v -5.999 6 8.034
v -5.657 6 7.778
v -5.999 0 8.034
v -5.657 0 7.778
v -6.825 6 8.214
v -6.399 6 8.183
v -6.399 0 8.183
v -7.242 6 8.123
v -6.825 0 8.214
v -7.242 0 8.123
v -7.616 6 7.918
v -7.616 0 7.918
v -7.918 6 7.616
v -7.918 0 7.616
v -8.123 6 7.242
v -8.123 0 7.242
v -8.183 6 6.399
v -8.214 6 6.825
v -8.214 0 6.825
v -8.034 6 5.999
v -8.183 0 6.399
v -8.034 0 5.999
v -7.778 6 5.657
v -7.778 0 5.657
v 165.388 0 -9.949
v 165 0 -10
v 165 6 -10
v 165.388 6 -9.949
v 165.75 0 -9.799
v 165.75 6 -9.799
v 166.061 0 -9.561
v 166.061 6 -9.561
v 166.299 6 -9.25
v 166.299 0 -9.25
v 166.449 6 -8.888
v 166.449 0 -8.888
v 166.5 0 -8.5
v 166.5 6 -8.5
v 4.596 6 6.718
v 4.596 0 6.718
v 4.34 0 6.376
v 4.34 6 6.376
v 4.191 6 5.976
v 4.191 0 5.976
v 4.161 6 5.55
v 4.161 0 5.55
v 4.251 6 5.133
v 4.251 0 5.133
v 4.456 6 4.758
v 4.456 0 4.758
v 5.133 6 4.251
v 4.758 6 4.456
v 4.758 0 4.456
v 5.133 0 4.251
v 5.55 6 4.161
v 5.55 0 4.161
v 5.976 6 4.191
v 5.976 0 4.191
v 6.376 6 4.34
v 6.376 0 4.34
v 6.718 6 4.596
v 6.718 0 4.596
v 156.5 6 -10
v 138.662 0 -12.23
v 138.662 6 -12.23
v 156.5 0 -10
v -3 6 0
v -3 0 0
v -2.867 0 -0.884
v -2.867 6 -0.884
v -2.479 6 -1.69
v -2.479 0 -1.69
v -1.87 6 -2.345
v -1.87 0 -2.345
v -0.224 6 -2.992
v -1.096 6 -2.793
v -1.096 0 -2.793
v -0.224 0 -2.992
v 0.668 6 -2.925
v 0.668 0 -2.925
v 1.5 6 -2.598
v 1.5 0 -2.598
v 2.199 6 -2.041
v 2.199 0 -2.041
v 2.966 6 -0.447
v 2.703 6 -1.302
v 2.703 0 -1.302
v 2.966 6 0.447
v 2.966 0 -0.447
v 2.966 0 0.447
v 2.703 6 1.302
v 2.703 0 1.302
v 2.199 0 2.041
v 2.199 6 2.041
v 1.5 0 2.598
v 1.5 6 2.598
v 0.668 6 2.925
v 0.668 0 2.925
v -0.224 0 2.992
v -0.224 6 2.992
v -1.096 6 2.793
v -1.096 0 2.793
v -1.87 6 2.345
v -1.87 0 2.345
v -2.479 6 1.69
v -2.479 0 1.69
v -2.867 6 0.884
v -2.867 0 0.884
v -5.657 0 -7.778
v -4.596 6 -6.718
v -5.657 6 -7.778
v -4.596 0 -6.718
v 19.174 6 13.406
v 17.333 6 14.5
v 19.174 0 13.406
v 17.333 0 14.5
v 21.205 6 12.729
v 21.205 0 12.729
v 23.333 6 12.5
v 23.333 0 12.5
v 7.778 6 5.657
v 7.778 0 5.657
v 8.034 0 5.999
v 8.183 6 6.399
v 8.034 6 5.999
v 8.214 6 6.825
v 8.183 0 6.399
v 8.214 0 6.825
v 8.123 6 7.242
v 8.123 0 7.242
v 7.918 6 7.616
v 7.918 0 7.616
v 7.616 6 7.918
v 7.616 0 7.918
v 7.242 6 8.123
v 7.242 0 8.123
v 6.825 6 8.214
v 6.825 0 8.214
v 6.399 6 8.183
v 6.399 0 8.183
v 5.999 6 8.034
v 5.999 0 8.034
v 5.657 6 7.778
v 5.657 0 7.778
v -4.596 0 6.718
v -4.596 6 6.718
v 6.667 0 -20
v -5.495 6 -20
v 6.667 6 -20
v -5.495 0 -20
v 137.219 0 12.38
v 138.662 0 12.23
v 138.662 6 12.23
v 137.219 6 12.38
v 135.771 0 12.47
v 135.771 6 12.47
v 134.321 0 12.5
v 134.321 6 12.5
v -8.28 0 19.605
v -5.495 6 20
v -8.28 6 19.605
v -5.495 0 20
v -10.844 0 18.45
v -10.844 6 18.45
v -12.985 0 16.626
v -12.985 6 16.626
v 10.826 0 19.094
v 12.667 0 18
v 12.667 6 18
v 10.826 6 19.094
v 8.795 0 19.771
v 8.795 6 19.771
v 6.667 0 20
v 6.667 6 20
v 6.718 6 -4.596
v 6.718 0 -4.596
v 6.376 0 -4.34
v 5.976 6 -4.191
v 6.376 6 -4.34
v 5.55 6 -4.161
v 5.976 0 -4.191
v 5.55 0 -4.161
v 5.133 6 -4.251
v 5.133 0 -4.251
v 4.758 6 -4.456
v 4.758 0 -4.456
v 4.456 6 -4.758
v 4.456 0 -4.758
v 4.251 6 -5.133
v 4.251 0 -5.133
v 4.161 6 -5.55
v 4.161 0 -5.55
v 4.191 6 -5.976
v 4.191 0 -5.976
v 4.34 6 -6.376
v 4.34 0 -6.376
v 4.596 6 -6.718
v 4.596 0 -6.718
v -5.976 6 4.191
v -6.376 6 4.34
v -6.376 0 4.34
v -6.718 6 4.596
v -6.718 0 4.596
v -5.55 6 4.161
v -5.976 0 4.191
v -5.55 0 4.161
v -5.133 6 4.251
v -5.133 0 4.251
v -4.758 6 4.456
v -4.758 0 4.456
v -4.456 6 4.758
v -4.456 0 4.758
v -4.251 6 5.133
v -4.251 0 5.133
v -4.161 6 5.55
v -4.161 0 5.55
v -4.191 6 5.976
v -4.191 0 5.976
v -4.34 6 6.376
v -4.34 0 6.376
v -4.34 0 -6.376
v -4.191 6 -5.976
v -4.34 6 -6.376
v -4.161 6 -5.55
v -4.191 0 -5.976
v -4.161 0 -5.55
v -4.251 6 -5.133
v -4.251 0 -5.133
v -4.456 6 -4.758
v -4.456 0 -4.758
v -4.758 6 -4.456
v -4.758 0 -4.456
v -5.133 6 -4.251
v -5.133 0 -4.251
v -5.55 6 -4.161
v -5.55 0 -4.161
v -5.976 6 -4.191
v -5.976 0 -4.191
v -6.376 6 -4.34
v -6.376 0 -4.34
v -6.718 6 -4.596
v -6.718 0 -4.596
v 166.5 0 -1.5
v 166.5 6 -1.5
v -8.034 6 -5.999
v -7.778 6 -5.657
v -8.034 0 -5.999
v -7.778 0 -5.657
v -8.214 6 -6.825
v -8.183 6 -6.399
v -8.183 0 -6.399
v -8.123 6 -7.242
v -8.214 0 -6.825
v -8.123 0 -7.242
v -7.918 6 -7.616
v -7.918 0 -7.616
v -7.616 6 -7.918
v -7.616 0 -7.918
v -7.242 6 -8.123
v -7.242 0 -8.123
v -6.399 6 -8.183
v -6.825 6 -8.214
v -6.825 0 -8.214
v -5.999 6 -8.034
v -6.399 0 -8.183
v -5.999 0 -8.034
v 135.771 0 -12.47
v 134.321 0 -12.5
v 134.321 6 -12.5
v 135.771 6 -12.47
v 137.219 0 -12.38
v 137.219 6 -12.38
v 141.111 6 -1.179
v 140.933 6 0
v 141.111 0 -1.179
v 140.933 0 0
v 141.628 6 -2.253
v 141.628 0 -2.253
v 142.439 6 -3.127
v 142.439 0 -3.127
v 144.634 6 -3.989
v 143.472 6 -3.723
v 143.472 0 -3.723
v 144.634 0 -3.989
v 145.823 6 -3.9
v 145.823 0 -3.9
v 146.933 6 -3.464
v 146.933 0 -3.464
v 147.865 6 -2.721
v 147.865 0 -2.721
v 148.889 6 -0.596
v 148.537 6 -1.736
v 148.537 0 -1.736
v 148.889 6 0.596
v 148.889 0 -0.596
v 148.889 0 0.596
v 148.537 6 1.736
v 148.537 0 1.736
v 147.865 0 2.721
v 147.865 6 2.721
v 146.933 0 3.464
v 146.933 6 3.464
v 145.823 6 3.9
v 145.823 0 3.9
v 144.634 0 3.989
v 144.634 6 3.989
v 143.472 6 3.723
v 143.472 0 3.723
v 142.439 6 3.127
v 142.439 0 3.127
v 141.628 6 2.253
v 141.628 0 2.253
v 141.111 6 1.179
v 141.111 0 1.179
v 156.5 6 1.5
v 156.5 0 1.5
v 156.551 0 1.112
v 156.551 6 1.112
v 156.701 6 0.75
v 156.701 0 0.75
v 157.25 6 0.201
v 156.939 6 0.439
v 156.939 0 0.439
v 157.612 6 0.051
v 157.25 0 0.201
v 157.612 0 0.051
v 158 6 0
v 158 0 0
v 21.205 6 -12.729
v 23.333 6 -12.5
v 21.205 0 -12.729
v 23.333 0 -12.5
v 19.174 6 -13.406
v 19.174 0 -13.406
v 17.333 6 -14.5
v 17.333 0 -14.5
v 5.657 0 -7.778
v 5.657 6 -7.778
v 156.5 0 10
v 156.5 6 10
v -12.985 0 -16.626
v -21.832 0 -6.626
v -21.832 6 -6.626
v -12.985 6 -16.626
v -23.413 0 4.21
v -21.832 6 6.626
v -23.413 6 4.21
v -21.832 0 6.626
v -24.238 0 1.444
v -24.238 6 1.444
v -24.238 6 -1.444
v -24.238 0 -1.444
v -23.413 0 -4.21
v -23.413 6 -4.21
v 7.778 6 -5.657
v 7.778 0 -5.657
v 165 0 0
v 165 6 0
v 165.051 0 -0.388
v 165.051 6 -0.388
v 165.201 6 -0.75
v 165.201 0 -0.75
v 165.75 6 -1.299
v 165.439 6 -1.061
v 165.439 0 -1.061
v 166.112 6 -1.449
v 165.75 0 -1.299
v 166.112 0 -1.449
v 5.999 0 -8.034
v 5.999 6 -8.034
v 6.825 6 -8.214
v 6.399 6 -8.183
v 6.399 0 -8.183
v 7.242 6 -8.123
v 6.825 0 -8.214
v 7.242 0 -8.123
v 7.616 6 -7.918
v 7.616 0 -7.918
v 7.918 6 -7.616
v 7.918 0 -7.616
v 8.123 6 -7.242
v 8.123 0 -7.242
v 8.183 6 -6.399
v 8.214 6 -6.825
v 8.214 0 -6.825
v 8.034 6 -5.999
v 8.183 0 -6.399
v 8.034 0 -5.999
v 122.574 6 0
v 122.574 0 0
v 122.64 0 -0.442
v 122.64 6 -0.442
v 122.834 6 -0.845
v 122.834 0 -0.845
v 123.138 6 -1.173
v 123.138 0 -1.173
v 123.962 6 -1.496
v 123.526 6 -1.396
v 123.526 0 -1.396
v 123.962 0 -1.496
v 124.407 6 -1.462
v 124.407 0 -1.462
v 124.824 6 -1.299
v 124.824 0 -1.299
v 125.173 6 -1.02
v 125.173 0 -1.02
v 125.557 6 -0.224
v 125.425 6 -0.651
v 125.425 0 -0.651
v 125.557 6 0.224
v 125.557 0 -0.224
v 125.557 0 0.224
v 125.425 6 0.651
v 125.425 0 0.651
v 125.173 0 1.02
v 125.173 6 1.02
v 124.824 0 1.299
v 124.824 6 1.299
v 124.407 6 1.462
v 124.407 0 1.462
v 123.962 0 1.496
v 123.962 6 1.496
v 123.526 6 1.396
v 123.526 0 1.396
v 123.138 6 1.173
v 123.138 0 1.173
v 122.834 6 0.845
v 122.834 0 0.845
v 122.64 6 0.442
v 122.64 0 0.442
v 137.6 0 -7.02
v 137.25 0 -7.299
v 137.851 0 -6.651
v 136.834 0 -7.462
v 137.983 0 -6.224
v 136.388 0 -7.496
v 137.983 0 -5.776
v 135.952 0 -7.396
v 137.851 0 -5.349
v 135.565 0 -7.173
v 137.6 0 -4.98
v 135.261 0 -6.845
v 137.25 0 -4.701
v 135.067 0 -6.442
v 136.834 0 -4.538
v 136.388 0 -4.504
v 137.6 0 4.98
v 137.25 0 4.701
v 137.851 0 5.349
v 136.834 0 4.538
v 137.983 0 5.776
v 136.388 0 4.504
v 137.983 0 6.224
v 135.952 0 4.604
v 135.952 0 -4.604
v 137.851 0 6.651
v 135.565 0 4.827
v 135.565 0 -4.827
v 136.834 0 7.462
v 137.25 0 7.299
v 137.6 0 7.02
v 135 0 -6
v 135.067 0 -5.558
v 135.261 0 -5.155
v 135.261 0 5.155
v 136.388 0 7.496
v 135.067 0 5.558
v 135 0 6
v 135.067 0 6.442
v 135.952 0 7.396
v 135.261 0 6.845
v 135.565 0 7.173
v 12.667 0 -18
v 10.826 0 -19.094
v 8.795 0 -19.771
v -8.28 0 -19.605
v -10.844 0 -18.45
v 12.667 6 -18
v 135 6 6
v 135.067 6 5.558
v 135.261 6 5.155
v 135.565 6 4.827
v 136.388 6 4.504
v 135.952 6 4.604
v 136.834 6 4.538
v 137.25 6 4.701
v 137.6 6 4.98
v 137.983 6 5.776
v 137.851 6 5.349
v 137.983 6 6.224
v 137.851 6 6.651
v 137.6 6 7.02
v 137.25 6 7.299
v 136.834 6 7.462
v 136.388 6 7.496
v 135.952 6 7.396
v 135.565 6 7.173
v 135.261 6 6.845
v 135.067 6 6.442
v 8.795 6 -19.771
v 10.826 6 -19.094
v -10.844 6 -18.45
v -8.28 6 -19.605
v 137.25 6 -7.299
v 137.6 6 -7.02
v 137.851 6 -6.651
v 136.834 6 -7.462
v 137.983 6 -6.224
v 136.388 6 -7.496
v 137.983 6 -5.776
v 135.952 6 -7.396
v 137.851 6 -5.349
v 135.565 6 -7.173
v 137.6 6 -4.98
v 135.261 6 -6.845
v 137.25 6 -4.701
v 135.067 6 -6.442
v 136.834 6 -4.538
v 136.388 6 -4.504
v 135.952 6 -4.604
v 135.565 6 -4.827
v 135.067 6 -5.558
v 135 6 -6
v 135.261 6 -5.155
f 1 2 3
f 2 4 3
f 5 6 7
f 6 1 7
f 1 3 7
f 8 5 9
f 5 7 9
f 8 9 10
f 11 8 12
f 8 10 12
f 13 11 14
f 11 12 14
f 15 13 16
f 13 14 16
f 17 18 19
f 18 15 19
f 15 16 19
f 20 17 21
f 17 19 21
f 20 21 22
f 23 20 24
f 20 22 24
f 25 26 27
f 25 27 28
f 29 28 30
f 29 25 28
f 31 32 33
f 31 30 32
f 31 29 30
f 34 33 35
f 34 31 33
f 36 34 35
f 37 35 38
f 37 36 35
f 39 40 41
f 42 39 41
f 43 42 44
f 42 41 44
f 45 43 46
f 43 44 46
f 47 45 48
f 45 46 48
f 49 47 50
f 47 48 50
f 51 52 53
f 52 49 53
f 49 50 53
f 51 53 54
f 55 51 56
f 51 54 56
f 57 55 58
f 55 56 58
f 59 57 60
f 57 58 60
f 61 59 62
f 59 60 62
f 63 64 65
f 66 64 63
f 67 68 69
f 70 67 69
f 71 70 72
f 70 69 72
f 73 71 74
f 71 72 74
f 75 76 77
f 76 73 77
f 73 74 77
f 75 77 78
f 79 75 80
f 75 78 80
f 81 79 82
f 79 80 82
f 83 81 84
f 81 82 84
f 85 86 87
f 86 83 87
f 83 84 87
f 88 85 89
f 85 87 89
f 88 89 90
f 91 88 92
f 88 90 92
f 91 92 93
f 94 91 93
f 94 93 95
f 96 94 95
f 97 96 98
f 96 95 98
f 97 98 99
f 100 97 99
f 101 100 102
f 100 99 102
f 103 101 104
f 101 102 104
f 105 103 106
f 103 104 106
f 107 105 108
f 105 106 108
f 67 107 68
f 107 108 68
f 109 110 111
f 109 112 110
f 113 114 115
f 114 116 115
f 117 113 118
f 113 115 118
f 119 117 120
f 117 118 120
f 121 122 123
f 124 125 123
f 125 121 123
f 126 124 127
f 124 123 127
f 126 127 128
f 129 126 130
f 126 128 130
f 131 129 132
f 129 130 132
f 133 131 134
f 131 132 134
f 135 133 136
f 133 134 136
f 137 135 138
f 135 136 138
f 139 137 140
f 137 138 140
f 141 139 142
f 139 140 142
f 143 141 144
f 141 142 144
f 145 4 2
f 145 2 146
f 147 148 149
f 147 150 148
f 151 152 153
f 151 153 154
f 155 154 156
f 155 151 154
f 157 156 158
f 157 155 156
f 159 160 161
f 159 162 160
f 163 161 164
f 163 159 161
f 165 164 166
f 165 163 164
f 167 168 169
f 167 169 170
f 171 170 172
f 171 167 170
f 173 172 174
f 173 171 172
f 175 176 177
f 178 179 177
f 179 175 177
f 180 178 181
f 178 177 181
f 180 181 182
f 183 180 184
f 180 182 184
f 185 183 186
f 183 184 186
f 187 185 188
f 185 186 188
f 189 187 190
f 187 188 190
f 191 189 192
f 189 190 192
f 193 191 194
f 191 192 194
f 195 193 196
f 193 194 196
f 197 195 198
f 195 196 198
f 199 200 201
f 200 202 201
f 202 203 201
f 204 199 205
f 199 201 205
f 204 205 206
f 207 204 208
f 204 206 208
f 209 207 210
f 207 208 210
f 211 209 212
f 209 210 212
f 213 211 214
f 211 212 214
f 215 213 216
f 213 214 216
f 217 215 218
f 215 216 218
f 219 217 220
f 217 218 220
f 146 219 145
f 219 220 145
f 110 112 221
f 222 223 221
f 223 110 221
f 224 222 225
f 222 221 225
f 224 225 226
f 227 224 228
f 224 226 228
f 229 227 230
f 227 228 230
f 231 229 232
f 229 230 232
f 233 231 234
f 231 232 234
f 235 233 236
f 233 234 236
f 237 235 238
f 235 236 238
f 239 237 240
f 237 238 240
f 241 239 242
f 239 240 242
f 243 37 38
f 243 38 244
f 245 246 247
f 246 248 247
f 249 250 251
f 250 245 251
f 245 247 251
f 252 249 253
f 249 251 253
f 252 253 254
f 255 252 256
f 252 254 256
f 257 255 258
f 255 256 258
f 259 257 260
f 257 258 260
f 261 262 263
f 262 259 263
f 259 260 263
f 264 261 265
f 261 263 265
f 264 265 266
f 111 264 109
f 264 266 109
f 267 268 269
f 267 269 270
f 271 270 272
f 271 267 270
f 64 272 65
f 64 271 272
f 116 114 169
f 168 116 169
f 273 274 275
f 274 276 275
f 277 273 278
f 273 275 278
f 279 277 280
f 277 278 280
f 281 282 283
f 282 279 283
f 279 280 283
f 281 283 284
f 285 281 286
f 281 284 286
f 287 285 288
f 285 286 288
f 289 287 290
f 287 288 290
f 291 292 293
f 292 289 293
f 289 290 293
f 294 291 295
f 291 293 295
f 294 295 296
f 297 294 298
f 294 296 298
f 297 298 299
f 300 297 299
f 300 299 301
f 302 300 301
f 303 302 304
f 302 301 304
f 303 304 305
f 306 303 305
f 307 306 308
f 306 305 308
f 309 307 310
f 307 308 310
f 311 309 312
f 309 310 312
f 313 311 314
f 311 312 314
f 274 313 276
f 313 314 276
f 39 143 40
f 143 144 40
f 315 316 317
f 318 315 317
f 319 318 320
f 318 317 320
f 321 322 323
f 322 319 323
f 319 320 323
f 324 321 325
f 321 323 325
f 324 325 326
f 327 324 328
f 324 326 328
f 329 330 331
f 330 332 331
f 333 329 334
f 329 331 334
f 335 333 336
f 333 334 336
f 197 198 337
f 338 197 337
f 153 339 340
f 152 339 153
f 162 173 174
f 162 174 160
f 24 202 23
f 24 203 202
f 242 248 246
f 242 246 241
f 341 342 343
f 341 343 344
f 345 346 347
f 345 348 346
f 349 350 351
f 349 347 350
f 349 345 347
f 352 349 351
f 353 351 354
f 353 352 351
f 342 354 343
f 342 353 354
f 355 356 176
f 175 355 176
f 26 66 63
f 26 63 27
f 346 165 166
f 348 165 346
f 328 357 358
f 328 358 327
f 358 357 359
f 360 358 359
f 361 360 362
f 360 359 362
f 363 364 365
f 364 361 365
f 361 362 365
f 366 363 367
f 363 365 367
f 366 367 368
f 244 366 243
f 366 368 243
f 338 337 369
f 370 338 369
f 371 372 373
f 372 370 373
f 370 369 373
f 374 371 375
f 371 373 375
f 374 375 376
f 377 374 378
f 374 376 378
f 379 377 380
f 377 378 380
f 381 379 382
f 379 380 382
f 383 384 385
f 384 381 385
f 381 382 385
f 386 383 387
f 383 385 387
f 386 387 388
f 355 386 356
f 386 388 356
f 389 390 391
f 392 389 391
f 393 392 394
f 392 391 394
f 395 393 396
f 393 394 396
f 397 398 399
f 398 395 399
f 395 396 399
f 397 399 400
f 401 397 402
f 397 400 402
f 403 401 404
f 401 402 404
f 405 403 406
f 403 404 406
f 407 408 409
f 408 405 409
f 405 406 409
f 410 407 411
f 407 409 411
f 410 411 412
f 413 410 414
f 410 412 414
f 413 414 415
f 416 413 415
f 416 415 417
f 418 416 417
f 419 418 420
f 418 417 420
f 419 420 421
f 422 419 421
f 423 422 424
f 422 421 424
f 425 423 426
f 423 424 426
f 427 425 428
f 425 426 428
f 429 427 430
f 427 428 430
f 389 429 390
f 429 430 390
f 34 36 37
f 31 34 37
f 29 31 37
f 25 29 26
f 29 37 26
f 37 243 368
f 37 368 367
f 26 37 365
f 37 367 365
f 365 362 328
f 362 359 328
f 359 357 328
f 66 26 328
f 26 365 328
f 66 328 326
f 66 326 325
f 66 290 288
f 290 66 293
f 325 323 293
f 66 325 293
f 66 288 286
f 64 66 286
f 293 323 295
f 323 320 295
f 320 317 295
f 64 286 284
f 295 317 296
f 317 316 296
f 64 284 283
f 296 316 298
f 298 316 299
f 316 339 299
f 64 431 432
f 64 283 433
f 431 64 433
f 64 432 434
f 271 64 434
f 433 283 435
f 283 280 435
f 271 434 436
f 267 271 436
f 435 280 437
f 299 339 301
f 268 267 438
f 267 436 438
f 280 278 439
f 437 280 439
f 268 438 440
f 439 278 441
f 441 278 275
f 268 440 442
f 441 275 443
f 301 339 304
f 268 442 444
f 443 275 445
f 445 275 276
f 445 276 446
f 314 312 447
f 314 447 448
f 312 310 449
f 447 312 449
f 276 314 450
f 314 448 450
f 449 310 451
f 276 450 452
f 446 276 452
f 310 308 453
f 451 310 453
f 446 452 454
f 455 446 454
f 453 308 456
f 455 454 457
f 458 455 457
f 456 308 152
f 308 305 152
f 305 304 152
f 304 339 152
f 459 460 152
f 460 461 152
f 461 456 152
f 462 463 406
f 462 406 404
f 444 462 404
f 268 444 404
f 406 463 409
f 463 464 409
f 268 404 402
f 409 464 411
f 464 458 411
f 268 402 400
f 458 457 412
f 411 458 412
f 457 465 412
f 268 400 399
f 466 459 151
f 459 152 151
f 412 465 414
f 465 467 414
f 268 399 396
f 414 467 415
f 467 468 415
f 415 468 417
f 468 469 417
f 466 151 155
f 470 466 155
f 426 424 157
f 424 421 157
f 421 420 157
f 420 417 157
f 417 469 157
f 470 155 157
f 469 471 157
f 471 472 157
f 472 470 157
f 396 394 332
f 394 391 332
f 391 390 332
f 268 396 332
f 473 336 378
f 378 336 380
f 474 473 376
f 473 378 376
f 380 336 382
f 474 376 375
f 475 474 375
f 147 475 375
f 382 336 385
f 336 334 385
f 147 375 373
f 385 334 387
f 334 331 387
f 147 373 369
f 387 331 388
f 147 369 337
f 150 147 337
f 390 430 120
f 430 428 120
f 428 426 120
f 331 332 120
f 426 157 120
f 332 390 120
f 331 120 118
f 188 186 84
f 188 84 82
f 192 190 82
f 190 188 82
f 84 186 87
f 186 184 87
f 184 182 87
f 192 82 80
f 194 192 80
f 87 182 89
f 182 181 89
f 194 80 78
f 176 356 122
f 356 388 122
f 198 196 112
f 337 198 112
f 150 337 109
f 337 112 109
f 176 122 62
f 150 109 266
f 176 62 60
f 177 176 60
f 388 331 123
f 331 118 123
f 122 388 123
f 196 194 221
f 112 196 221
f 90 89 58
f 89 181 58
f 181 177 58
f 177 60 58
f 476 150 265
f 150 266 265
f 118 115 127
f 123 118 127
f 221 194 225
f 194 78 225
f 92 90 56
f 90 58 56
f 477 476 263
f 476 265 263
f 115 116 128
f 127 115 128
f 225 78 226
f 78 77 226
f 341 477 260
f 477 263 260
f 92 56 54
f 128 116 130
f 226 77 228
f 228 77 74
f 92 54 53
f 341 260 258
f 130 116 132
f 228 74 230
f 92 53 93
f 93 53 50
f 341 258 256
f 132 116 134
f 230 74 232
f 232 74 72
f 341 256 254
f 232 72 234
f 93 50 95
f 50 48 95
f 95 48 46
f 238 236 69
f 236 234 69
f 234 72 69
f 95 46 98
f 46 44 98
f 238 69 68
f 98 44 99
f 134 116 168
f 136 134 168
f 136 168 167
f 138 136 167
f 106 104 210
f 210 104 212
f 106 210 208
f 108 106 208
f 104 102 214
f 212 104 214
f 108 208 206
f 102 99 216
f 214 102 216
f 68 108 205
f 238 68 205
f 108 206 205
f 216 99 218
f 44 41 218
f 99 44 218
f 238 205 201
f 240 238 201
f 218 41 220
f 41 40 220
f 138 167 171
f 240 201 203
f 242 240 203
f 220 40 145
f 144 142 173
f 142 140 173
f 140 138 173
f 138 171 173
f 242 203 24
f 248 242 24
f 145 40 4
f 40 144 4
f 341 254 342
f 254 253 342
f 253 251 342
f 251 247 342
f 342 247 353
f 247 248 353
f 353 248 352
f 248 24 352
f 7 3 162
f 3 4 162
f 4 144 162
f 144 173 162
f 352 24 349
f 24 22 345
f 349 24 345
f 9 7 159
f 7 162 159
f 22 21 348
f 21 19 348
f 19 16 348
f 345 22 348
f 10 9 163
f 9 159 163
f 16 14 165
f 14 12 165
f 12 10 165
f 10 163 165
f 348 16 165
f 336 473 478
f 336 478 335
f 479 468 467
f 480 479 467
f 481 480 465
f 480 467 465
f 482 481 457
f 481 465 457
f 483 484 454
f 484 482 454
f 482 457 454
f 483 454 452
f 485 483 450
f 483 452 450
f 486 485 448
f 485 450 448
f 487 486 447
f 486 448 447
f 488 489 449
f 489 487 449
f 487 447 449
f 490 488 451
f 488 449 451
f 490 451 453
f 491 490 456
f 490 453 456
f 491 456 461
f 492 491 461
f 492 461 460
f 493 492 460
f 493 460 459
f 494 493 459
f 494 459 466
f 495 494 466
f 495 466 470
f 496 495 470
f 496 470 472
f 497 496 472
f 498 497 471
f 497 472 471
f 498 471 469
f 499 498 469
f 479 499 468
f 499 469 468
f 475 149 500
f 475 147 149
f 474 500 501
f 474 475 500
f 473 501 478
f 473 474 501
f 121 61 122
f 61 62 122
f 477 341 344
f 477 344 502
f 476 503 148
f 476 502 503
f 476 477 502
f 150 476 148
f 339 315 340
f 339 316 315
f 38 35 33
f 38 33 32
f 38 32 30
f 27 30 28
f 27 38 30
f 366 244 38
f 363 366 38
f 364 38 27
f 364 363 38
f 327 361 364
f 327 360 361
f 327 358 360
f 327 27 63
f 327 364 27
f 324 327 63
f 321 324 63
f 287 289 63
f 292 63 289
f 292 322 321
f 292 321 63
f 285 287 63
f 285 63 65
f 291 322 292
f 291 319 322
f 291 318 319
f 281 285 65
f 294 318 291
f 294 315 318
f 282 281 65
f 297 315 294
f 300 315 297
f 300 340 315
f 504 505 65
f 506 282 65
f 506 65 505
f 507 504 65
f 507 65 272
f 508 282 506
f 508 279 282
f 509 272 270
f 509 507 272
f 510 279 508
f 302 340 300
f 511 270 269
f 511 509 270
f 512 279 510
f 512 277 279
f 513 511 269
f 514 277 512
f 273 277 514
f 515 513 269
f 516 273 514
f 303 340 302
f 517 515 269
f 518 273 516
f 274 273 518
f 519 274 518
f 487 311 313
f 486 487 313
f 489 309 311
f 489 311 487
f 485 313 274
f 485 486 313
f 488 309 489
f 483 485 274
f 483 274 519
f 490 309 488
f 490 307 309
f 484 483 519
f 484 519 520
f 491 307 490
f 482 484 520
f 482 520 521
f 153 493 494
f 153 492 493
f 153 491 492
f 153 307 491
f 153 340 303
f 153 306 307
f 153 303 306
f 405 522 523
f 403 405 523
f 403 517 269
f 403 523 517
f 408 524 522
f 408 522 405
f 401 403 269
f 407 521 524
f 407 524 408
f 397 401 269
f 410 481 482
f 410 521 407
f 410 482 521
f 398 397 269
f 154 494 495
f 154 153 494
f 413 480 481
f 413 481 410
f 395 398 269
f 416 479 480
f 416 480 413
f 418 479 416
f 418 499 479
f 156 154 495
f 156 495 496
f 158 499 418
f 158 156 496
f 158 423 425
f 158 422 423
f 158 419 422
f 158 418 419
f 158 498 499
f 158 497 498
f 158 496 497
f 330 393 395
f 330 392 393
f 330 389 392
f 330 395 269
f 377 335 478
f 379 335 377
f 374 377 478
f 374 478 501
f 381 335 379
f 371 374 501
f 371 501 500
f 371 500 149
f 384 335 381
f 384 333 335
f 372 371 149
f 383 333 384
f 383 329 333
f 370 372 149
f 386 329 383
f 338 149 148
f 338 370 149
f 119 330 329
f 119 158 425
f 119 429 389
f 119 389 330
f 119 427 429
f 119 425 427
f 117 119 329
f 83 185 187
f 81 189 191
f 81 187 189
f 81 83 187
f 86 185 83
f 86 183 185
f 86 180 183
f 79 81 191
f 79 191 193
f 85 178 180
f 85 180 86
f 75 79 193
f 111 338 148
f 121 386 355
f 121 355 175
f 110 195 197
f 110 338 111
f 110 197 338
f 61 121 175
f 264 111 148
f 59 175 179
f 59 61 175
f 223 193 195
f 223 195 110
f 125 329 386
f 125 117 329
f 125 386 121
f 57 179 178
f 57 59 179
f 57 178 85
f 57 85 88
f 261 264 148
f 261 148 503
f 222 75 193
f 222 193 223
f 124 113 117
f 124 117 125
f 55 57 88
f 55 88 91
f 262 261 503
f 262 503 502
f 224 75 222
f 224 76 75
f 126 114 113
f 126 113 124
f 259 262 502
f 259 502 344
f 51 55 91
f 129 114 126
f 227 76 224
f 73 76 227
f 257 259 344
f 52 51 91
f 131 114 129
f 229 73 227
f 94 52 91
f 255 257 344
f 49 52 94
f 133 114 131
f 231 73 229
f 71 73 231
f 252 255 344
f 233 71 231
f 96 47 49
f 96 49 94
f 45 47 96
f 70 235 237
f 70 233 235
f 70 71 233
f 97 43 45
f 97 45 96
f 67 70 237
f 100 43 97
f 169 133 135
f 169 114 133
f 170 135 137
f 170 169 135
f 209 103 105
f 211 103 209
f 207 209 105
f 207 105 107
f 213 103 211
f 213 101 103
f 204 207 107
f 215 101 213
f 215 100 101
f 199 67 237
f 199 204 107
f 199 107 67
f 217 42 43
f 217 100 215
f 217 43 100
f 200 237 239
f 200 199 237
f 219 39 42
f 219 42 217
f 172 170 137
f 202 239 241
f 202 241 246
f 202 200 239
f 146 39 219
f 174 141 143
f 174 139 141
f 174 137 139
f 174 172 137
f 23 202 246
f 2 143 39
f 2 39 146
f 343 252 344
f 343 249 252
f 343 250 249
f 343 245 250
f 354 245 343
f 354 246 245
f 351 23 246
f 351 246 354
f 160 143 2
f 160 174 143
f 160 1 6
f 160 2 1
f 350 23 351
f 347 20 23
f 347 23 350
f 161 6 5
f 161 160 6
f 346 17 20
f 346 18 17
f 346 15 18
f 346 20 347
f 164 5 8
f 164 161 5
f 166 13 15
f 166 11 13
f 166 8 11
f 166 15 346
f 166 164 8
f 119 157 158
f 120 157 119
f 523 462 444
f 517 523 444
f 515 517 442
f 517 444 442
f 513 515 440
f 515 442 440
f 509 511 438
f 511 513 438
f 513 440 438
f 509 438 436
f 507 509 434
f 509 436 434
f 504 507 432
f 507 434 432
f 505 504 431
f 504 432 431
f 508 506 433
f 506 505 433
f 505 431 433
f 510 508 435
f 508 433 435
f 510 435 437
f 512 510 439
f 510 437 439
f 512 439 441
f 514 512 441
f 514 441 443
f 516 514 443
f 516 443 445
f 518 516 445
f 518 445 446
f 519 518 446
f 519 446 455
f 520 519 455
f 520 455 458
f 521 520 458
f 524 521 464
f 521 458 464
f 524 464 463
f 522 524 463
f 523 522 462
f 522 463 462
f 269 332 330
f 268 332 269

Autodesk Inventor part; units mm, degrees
ref_plane "YZ Plane" through (0, 0, 0) normal (1, 0, 0) x (0, 1, 0)
ref_plane "XZ Plane" through (0, 0, 0) normal (0, 1, 0) x (-1, 0, 0)
ref_plane "XY Plane" through (0, 0, 0) normal (0, 0, 1) x (1, 0, 0)
sketch "Sketch1" plane through (0, 0, 0) normal (0, 1, 0) x (-1, 0, 0)
  arc A0 (-166.5, -1.5) -> (-165, 0) centre (-166.5, 0) ccw
  line L0 (-165, 0) -> (-158, 0)
  arc A1 (-158, 0) -> (-156.5, 1.5) centre (-158, 1.5) ccw
  line L1 (-156.5, 1.5) -> (-156.5, 10)
  line L2 (-156.5, 10) -> (-138.6622, 12.2297)
  arc A2 (-134.321, 12.5) -> (-138.6622, 12.2297) centre (-134.321, -22.5) ccw
  line L3 (-134.321, 12.5) -> (-23.3333, 12.5)
  arc A3 (-23.3333, 12.5) -> (-17.3333, 14.5) centre (-23.3333, 22.5) ccw
  line L4 (-17.3333, 14.5) -> (-12.6667, 18)
  arc A4 (-6.6667, 20) -> (-12.6667, 18) centre (-6.6667, 10) ccw
  line L5 (-6.6667, 20) -> (5.4953, 20)
  arc A5 (12.9849, 16.6262) -> (5.4953, 20) centre (5.4953, 10) ccw
  line L6 (12.9849, 16.6262) -> (21.8321, 6.6262)
  arc A6 (21.8321, -6.6262) -> (21.8321, 6.6262) centre (14.3426, 0) ccw
  line L7 (21.8321, -6.6262) -> (12.9849, -16.6262)
  arc A7 (5.4953, -20) -> (12.9849, -16.6262) centre (5.4953, -10) ccw
  line L8 (5.4953, -20) -> (-6.6667, -20)
  arc A8 (-12.6667, -18) -> (-6.6667, -20) centre (-6.6667, -10) ccw
  line L9 (-12.6667, -18) -> (-17.3333, -14.5)
  arc A9 (-17.3333, -14.5) -> (-23.3333, -12.5) centre (-23.3333, -22.5) ccw
  line L10 (-23.3333, -12.5) -> (-134.321, -12.5)
  arc A10 (-138.6622, -12.2297) -> (-134.321, -12.5) centre (-134.321, 22.5) ccw
  line L11 (-138.6622, -12.2297) -> (-156.5, -10)
  line L12 (-156.5, -10) -> (-165, -10)
  arc A11 (-166.5, -8.5) -> (-165, -10) centre (-165, -8.5) ccw
  line L13 (-166.5, -8.5) -> (-166.5, -1.5)
  arc A12 (4.5962, 6.7175) -> (6.7175, 4.5962) centre (5.6569, 5.6569) ccw
  line L14 (6.7175, 4.5962) -> (7.7782, 5.6569)
  arc A13 (7.7782, 5.6569) -> (5.6569, 7.7782) centre (6.7175, 6.7175) ccw
  line L15 (5.6569, 7.7782) -> (4.5962, 6.7175)
  line L16 (-4.5962, -6.7175) -> (-5.6569, -7.7782)
  arc A14 (-7.7782, -5.6569) -> (-5.6569, -7.7782) centre (-6.7175, -6.7175) ccw
  line L17 (-7.7782, -5.6569) -> (-6.7175, -4.5962)
  arc A15 (-4.5962, -6.7175) -> (-6.7175, -4.5962) centre (-5.6569, -5.6569) ccw
  arc A16 (6.7175, -4.5962) -> (4.5962, -6.7175) centre (5.6569, -5.6569) ccw
  line L18 (4.5962, -6.7175) -> (5.6569, -7.7782)
  arc A17 (5.6569, -7.7782) -> (7.7782, -5.6569) centre (6.7175, -6.7175) ccw
  line L19 (7.7782, -5.6569) -> (6.7175, -4.5962)
  line L20 (-5.6569, 7.7782) -> (-4.5962, 6.7175)
  arc A18 (-6.7175, 4.5962) -> (-4.5962, 6.7175) centre (-5.6569, 5.6569) ccw
  line L21 (-6.7175, 4.5962) -> (-7.7782, 5.6569)
  arc A19 (-5.6569, 7.7782) -> (-7.7782, 5.6569) centre (-6.7175, 6.7175) ccw
  circle A20 centre (-136.5, -6) radius 1.5
  circle A21 centre (-124.0736, 0) radius 1.5
  circle A22 centre (-144.9332, 0) radius 4
  circle A23 centre (0, 0) radius 3
  circle A24 centre (-136.5, 6) radius 1.5
  point P0 (5.4953, -20)
  point P1 (12.9849, -16.6262)
  point P2 (21.8321, -6.6262)
  point P3 (21.8321, 6.6262)
  point P4 (-12.6667, 18)
  point P5 (-165, -10)
  point P6 (7.7782, 5.6569)
  point P7 (5.6569, 7.7782)
  point P8 (6.7175, -4.5962)
  point P9 (5.6569, -7.7782)
  point P10 (4.5962, -6.7175)
  point P11 (-4.5962, -6.7175)
  point P12 (-5.6569, -7.7782)
  point P13 (-6.7175, -4.5962)
  point P14 (-7.7782, 5.6569)
  point P15 (-5.6569, 7.7782)
extrude "Extrusion1" add sketch "Sketch1" along normal blind 6
properties part number "TokerCNC arm"
